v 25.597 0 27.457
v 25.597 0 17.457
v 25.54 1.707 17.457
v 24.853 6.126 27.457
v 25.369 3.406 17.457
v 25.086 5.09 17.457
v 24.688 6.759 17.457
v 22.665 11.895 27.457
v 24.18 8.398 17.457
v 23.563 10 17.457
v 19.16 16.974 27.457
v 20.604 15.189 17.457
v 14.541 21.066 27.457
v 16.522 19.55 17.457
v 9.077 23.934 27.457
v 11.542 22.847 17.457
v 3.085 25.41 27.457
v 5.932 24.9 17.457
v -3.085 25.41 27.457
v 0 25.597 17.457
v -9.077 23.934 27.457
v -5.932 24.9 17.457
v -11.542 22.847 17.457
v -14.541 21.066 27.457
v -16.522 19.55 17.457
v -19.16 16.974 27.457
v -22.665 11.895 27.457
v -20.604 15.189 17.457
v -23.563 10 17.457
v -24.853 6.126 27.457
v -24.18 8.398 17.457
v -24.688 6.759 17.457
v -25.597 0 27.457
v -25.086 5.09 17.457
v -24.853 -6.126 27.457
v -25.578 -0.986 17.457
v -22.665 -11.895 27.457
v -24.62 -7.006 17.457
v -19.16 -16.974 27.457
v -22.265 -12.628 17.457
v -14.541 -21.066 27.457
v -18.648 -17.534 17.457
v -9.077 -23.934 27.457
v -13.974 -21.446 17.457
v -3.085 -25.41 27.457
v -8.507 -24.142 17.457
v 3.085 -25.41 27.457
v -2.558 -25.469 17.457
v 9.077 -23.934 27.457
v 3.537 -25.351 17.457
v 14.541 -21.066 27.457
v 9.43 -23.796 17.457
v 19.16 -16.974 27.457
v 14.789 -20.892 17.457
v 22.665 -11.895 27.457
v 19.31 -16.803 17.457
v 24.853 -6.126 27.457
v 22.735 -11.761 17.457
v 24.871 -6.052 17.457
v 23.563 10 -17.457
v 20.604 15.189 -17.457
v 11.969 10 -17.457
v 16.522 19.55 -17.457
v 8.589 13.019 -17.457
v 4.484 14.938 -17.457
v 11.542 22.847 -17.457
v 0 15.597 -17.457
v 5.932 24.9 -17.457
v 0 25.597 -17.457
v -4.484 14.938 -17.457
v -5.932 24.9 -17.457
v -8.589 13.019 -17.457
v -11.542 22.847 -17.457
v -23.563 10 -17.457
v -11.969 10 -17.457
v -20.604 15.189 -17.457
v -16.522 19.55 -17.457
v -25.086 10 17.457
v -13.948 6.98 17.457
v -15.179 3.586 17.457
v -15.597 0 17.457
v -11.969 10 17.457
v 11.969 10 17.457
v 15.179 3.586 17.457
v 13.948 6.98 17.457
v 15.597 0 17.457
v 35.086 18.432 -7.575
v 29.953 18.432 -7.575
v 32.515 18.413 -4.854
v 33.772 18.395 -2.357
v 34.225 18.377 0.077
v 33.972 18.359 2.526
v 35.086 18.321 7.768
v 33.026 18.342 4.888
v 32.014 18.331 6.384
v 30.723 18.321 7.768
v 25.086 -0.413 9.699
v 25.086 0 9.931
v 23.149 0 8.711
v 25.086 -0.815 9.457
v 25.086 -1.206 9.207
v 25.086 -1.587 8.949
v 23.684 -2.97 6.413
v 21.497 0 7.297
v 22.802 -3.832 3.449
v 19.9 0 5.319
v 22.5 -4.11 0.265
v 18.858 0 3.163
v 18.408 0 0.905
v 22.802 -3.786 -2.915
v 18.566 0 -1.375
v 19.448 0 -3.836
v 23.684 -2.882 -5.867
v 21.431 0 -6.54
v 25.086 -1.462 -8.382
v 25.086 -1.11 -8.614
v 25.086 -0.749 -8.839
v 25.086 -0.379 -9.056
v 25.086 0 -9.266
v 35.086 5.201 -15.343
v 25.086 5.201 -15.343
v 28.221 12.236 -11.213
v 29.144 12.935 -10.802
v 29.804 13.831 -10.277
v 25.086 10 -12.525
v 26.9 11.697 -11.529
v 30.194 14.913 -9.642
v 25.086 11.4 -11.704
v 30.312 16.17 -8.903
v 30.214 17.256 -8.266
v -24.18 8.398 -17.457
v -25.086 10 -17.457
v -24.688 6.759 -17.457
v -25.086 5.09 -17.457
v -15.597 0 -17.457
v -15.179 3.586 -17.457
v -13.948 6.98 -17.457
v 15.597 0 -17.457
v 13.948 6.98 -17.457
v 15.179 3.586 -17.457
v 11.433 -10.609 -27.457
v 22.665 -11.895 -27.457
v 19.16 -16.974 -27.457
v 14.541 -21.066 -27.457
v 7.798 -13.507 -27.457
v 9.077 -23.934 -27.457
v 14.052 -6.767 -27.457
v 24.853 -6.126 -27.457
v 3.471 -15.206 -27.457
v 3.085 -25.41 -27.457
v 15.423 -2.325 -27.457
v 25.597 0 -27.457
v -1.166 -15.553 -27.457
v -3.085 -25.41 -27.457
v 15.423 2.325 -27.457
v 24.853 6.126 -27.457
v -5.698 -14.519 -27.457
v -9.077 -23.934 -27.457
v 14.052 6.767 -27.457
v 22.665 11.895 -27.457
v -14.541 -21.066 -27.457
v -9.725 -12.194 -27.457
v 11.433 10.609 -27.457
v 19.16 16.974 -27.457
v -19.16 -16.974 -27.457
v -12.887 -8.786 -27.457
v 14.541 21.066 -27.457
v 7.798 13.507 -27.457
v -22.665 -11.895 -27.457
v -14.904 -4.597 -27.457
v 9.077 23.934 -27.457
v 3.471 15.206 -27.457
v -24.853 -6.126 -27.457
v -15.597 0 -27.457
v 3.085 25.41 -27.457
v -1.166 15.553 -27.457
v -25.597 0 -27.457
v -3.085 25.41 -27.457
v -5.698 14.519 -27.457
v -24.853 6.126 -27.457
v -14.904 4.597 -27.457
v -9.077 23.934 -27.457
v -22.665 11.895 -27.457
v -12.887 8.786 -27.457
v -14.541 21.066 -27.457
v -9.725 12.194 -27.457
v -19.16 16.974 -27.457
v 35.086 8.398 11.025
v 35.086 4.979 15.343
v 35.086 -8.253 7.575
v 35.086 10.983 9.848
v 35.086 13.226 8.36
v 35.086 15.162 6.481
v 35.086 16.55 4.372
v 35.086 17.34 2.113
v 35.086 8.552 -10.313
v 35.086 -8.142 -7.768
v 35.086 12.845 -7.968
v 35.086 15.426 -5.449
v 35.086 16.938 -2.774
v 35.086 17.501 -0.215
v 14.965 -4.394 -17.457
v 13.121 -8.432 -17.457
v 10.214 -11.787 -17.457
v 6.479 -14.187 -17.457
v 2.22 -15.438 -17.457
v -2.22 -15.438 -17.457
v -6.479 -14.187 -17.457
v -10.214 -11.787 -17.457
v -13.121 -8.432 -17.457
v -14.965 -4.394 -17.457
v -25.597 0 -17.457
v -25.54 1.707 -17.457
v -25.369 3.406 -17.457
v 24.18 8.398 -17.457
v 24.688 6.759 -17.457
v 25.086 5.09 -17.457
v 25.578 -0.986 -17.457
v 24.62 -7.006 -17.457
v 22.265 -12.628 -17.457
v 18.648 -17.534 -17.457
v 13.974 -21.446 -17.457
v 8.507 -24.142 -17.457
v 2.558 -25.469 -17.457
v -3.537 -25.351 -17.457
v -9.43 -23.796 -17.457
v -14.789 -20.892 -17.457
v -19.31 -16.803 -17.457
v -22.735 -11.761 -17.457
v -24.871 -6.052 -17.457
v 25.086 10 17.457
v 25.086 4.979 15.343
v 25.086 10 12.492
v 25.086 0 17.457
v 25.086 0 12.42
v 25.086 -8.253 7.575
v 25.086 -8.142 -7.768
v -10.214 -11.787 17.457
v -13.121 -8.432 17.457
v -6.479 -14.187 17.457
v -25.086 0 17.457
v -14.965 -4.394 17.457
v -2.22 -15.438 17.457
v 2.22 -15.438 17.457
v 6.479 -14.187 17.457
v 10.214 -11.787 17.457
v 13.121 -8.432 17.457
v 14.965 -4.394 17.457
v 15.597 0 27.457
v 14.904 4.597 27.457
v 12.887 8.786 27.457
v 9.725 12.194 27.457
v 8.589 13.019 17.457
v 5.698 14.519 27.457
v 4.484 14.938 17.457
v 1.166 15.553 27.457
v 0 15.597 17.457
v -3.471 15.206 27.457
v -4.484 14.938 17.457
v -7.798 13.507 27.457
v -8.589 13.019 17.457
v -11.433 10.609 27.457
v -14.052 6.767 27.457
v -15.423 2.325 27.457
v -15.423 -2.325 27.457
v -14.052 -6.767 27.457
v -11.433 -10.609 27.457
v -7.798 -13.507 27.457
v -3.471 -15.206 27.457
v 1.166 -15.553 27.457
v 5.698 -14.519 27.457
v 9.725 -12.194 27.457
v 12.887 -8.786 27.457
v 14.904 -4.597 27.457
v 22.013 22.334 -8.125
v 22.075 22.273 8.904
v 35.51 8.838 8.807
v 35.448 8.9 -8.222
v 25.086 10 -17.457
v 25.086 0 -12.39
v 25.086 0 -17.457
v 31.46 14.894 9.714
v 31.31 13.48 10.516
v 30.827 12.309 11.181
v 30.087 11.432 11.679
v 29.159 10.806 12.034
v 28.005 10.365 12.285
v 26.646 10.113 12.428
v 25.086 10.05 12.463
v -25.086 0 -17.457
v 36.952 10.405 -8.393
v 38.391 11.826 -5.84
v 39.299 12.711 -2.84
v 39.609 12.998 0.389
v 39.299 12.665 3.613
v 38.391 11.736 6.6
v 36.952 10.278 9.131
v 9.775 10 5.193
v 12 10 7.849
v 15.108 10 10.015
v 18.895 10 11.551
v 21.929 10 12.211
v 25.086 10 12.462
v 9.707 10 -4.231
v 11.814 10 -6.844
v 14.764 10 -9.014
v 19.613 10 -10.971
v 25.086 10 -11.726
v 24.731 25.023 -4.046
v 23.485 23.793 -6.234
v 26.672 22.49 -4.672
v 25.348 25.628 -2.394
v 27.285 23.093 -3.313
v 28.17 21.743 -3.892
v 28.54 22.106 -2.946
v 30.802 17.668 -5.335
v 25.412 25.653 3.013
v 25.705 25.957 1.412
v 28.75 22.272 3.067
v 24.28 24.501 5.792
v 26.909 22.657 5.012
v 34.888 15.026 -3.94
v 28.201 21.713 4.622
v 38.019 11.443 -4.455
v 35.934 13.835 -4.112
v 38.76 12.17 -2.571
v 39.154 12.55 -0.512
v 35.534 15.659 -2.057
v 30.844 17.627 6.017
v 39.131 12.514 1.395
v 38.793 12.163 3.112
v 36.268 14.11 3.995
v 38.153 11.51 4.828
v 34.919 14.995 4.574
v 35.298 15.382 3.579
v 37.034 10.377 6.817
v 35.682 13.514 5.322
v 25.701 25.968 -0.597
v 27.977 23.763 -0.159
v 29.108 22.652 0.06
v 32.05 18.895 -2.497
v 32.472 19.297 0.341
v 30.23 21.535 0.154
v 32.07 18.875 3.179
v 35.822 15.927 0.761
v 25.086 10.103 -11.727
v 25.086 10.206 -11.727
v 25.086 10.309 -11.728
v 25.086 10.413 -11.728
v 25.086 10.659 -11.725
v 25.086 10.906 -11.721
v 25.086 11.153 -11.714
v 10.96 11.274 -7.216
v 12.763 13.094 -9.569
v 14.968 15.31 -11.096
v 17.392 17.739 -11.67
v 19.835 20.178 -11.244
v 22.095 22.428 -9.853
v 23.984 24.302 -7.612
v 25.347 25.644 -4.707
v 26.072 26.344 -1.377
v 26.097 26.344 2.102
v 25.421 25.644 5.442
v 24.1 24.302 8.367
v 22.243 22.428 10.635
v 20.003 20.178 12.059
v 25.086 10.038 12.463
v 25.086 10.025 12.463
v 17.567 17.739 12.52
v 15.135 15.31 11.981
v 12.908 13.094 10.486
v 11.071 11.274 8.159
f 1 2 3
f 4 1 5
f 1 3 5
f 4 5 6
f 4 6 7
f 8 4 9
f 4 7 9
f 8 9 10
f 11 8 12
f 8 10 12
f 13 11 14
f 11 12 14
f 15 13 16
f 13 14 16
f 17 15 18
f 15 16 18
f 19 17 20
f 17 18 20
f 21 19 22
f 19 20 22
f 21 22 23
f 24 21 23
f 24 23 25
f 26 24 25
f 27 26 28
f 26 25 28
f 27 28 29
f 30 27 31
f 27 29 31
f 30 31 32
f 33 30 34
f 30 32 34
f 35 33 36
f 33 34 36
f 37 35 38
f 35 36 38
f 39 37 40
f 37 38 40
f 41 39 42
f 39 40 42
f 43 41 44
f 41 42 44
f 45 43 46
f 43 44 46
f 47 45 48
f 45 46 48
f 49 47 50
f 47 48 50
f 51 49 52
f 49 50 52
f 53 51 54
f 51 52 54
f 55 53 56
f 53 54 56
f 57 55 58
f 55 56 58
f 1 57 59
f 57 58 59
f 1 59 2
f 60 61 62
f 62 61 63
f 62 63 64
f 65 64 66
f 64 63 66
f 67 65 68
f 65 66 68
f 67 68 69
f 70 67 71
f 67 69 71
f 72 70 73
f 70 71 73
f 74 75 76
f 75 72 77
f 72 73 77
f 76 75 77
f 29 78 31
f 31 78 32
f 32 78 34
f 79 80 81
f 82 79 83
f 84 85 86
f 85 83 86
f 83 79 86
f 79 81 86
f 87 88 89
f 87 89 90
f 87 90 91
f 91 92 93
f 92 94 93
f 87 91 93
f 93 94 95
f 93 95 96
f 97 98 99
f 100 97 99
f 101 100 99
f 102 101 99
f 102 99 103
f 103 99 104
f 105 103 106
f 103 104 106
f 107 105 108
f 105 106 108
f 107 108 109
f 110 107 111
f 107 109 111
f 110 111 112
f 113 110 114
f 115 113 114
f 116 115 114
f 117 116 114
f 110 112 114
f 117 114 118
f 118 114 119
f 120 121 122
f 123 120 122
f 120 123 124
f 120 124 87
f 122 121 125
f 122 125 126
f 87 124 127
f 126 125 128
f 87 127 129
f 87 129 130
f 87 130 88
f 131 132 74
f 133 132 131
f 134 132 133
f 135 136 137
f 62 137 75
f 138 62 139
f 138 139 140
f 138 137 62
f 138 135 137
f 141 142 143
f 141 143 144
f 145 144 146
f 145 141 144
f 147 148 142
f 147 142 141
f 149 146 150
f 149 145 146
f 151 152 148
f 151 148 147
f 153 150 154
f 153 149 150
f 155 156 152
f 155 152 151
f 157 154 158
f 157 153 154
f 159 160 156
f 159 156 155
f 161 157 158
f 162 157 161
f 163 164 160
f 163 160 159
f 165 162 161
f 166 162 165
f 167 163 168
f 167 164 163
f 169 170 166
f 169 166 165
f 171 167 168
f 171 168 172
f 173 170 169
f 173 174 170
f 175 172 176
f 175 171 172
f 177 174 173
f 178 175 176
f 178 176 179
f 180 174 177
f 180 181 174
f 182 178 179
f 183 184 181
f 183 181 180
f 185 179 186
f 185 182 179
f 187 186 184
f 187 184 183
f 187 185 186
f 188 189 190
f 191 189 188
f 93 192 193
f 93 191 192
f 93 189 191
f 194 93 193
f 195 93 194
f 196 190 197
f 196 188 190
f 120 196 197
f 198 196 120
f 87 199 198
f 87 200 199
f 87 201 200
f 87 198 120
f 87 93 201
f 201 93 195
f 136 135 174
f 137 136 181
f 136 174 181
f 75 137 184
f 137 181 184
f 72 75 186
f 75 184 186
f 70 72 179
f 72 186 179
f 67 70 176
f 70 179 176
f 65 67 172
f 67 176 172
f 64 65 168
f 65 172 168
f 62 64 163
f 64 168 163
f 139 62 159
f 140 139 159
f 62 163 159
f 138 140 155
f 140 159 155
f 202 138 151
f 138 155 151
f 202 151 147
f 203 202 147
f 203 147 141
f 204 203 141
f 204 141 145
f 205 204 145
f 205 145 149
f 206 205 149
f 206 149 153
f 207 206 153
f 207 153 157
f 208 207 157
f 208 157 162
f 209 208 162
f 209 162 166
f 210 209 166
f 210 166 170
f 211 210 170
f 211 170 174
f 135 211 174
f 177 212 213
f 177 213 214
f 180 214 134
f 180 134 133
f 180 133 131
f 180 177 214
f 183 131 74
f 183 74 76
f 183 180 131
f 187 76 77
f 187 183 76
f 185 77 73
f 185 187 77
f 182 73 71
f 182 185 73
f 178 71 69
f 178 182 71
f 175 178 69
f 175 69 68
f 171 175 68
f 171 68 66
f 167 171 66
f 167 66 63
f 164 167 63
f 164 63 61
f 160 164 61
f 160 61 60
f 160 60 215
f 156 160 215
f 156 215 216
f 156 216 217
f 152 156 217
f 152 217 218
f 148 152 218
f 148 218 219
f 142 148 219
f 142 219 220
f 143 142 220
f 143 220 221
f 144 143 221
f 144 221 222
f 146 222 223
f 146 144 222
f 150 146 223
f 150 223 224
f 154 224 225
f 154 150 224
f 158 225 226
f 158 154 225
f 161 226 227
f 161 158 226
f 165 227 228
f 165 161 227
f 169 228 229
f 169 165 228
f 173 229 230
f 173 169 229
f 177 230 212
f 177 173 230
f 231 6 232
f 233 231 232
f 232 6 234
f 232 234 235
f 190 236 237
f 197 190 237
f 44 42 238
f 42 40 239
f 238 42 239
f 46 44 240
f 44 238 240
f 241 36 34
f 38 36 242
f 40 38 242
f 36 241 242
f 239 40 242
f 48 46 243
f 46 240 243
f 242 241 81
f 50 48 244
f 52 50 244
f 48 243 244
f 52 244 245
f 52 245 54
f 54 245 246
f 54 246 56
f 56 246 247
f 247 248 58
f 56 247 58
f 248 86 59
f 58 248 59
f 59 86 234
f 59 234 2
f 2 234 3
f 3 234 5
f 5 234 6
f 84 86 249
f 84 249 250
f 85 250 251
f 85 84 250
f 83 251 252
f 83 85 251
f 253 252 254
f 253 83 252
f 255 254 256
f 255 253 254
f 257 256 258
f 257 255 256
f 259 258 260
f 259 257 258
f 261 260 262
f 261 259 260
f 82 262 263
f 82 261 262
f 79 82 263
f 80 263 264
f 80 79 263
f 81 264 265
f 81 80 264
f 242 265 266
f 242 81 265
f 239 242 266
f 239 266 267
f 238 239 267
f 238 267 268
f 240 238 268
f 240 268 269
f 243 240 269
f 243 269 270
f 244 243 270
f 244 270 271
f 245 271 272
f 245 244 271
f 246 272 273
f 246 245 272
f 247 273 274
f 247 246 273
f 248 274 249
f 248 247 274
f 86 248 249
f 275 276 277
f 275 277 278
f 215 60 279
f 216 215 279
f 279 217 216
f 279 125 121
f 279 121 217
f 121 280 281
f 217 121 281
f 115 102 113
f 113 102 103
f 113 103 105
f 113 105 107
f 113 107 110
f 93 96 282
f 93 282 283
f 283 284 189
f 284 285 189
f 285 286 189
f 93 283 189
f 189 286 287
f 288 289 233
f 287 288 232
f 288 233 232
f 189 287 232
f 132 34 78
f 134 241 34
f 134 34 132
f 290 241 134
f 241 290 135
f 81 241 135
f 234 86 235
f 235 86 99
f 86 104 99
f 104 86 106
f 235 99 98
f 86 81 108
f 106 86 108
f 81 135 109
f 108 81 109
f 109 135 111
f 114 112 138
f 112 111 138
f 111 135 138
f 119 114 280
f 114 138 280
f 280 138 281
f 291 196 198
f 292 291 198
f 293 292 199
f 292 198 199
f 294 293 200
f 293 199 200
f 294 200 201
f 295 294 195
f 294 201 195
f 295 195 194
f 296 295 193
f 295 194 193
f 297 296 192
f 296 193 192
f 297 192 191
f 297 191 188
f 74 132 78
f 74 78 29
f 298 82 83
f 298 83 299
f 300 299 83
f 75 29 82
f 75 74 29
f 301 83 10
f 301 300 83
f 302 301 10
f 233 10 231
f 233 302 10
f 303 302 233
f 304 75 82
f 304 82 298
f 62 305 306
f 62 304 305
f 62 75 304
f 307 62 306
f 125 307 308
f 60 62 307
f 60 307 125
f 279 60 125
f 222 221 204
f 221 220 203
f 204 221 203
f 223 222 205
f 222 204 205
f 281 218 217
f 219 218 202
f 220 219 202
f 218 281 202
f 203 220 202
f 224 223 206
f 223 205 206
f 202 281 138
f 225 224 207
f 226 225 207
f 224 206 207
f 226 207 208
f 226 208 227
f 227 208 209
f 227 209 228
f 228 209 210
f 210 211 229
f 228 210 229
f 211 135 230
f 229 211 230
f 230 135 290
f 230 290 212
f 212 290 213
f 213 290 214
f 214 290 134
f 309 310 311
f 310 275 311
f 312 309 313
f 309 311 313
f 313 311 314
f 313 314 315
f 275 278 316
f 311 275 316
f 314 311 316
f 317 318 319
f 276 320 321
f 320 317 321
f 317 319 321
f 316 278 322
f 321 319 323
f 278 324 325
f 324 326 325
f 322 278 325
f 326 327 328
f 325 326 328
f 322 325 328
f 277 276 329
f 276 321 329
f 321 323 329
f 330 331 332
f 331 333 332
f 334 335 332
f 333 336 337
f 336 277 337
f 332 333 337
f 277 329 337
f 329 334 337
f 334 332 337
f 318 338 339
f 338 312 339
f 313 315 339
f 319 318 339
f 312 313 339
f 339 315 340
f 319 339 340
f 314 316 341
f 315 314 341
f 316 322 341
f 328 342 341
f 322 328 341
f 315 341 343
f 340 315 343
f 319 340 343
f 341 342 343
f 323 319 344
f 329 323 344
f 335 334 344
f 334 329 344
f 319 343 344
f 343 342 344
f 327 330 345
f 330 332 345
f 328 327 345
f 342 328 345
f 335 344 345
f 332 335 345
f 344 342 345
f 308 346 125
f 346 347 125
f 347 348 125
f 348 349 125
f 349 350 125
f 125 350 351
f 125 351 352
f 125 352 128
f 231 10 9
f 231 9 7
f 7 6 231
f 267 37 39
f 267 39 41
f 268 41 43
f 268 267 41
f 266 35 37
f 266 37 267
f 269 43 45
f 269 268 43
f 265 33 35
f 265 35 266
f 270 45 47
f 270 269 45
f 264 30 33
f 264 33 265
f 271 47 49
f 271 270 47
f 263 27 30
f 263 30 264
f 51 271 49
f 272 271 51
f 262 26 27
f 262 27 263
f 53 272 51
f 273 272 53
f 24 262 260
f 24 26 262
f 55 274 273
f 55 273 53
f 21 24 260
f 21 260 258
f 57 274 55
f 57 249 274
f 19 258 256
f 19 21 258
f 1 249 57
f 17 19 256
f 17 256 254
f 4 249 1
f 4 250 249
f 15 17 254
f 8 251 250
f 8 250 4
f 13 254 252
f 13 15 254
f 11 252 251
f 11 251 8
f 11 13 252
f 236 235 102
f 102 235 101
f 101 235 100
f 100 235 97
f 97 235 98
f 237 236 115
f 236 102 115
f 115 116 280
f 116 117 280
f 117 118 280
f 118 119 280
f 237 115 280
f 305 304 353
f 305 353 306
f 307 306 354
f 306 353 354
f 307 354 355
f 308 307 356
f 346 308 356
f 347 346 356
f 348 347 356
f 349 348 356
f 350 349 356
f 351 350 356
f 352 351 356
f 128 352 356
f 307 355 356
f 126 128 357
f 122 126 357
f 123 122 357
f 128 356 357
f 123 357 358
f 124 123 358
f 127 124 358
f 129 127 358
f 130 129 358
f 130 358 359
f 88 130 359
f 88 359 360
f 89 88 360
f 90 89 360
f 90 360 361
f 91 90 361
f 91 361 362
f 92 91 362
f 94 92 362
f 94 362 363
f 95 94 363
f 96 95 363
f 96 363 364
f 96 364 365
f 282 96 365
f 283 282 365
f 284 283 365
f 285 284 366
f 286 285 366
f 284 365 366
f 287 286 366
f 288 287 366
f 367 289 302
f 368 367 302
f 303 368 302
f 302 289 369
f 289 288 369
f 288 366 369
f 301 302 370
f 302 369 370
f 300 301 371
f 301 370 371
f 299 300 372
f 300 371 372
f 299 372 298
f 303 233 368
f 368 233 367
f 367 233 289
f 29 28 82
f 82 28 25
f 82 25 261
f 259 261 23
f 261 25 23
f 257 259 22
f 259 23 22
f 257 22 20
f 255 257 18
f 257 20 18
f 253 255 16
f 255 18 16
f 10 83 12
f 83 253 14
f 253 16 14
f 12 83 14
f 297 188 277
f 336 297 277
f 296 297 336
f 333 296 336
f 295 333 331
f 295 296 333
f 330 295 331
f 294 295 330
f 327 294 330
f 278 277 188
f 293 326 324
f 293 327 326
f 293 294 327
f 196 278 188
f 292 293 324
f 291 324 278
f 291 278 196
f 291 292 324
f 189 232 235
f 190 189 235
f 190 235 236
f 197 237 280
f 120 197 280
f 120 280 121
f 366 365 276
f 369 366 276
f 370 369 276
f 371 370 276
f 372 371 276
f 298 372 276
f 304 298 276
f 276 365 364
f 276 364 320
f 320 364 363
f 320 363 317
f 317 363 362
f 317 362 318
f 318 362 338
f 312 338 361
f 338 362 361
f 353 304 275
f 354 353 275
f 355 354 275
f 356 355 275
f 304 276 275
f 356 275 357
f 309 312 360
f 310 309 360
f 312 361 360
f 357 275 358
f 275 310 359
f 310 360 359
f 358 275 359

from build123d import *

# Parameters (mm, degrees)
SKETCH_1_W           = 50.17161873
SKETCH_1_H           = 34.913239838
EXTRUDE_1_DEPTH      = 10
SKETCH_2_R           = 25.596904926
SKETCH_2_R_2         = 15.596904926
EXTRUDE_1_2_DEPTH    = 10
EXTRUDE_START        = 10
SKETCH_3_R           = 25.596904926
SKETCH_3_R_2         = 15.596904926
EXTRUDE_2_DEPTH      = 10
EXTRUDE_2_2_DEPTH    = 10
EXTRUDE_3_DEPTH      = 7
EXTRUDE_3_DEPTH_BACK = 12
SKETCH_5_R           = 12.097292752
CUT_EXTRUDE_1_DEPTH  = 63.060098254


with BuildPart() as part:
    # 草圖1 → Extrude 1 (new body)
    with BuildSketch(Plane(origin=(0, 0, 0), x_dir=(1, 0, 0), z_dir=(0, 1, 0))):
        Rectangle(SKETCH_1_W, SKETCH_1_H)
    extrude(amount=EXTRUDE_1_DEPTH)

    # 草圖2 → Extrude 1 2 (add)
    with BuildSketch(Plane.XY.offset(17.456619919)):
        Circle(SKETCH_2_R)
        Circle(SKETCH_2_R_2, mode=Mode.SUBTRACT)
    extrude(amount=EXTRUDE_1_2_DEPTH)

    # 草圖3 → Extrude 2 (add)
    with BuildSketch(Plane(origin=(0, 0, -17.456619919), x_dir=(-1, 0, 0), z_dir=(0, 0, -1)).offset(EXTRUDE_START)):
        Circle(SKETCH_3_R)
        Circle(SKETCH_3_R_2, mode=Mode.SUBTRACT)
    extrude(amount=-EXTRUDE_2_DEPTH)

    # 草圖4 → Extrude 2 2 (add)
    with BuildSketch(Plane(origin=(25.085809365, 0, 0), x_dir=(0, 0, -1), z_dir=(1, 0, 0))):
        Polygon((7.767540636, -8.142290403), (15.342896504, 5.2005267), (7.575355868, 18.432385876), (-7.767540636, 18.321427949), (-15.342896504, 4.978610845), (-7.575355868, -8.253248331), align=None)
    extrude(amount=EXTRUDE_2_2_DEPTH)

    # 草圖5 → 填料-伸長3 (add, two sides: drawn at the far end of the back side and taken through both)
    with BuildSketch(Plane(origin=(8.35434404, -8.354125583, -0.060416002), x_dir=(-0.003615890802849244, 0.003615796250954227, -0.9999869255901167), z_dir=(0.7071067811865482, -0.7070882910578936, -0.005113574955600474)).offset(-EXTRUDE_3_DEPTH_BACK)):
        with Locations((-0.42297231, 25.100981723)):
            Circle(SKETCH_5_R)
    extrude(amount=EXTRUDE_3_DEPTH + EXTRUDE_3_DEPTH_BACK)

    # 草圖6 → 除料-伸長1 (cut, through all)
    with BuildSketch(Plane(origin=(13.304091508, -13.30374362, -0.096211026), x_dir=(-0.0036158908028492477, 0.0036157962509542232, -0.9999869255901167), z_dir=(0.7071067811865483, -0.7070882910578935, -0.005113574955600474))):
        with BuildLine():
            Line((-8.90297564, 31.358512716), (8.125719102, 31.358512716))
            add(Edge.make_bspline(
                [(8.125719102, 31.358512716), (-0.388628269, 41.854112763), (-8.90297564, 31.358512716)],
                knots=[0, 0, 0, 1, 1, 1], degree=2))
        make_face()
    extrude(amount=-CUT_EXTRUDE_1_DEPTH, mode=Mode.SUBTRACT)


solid = part.part
